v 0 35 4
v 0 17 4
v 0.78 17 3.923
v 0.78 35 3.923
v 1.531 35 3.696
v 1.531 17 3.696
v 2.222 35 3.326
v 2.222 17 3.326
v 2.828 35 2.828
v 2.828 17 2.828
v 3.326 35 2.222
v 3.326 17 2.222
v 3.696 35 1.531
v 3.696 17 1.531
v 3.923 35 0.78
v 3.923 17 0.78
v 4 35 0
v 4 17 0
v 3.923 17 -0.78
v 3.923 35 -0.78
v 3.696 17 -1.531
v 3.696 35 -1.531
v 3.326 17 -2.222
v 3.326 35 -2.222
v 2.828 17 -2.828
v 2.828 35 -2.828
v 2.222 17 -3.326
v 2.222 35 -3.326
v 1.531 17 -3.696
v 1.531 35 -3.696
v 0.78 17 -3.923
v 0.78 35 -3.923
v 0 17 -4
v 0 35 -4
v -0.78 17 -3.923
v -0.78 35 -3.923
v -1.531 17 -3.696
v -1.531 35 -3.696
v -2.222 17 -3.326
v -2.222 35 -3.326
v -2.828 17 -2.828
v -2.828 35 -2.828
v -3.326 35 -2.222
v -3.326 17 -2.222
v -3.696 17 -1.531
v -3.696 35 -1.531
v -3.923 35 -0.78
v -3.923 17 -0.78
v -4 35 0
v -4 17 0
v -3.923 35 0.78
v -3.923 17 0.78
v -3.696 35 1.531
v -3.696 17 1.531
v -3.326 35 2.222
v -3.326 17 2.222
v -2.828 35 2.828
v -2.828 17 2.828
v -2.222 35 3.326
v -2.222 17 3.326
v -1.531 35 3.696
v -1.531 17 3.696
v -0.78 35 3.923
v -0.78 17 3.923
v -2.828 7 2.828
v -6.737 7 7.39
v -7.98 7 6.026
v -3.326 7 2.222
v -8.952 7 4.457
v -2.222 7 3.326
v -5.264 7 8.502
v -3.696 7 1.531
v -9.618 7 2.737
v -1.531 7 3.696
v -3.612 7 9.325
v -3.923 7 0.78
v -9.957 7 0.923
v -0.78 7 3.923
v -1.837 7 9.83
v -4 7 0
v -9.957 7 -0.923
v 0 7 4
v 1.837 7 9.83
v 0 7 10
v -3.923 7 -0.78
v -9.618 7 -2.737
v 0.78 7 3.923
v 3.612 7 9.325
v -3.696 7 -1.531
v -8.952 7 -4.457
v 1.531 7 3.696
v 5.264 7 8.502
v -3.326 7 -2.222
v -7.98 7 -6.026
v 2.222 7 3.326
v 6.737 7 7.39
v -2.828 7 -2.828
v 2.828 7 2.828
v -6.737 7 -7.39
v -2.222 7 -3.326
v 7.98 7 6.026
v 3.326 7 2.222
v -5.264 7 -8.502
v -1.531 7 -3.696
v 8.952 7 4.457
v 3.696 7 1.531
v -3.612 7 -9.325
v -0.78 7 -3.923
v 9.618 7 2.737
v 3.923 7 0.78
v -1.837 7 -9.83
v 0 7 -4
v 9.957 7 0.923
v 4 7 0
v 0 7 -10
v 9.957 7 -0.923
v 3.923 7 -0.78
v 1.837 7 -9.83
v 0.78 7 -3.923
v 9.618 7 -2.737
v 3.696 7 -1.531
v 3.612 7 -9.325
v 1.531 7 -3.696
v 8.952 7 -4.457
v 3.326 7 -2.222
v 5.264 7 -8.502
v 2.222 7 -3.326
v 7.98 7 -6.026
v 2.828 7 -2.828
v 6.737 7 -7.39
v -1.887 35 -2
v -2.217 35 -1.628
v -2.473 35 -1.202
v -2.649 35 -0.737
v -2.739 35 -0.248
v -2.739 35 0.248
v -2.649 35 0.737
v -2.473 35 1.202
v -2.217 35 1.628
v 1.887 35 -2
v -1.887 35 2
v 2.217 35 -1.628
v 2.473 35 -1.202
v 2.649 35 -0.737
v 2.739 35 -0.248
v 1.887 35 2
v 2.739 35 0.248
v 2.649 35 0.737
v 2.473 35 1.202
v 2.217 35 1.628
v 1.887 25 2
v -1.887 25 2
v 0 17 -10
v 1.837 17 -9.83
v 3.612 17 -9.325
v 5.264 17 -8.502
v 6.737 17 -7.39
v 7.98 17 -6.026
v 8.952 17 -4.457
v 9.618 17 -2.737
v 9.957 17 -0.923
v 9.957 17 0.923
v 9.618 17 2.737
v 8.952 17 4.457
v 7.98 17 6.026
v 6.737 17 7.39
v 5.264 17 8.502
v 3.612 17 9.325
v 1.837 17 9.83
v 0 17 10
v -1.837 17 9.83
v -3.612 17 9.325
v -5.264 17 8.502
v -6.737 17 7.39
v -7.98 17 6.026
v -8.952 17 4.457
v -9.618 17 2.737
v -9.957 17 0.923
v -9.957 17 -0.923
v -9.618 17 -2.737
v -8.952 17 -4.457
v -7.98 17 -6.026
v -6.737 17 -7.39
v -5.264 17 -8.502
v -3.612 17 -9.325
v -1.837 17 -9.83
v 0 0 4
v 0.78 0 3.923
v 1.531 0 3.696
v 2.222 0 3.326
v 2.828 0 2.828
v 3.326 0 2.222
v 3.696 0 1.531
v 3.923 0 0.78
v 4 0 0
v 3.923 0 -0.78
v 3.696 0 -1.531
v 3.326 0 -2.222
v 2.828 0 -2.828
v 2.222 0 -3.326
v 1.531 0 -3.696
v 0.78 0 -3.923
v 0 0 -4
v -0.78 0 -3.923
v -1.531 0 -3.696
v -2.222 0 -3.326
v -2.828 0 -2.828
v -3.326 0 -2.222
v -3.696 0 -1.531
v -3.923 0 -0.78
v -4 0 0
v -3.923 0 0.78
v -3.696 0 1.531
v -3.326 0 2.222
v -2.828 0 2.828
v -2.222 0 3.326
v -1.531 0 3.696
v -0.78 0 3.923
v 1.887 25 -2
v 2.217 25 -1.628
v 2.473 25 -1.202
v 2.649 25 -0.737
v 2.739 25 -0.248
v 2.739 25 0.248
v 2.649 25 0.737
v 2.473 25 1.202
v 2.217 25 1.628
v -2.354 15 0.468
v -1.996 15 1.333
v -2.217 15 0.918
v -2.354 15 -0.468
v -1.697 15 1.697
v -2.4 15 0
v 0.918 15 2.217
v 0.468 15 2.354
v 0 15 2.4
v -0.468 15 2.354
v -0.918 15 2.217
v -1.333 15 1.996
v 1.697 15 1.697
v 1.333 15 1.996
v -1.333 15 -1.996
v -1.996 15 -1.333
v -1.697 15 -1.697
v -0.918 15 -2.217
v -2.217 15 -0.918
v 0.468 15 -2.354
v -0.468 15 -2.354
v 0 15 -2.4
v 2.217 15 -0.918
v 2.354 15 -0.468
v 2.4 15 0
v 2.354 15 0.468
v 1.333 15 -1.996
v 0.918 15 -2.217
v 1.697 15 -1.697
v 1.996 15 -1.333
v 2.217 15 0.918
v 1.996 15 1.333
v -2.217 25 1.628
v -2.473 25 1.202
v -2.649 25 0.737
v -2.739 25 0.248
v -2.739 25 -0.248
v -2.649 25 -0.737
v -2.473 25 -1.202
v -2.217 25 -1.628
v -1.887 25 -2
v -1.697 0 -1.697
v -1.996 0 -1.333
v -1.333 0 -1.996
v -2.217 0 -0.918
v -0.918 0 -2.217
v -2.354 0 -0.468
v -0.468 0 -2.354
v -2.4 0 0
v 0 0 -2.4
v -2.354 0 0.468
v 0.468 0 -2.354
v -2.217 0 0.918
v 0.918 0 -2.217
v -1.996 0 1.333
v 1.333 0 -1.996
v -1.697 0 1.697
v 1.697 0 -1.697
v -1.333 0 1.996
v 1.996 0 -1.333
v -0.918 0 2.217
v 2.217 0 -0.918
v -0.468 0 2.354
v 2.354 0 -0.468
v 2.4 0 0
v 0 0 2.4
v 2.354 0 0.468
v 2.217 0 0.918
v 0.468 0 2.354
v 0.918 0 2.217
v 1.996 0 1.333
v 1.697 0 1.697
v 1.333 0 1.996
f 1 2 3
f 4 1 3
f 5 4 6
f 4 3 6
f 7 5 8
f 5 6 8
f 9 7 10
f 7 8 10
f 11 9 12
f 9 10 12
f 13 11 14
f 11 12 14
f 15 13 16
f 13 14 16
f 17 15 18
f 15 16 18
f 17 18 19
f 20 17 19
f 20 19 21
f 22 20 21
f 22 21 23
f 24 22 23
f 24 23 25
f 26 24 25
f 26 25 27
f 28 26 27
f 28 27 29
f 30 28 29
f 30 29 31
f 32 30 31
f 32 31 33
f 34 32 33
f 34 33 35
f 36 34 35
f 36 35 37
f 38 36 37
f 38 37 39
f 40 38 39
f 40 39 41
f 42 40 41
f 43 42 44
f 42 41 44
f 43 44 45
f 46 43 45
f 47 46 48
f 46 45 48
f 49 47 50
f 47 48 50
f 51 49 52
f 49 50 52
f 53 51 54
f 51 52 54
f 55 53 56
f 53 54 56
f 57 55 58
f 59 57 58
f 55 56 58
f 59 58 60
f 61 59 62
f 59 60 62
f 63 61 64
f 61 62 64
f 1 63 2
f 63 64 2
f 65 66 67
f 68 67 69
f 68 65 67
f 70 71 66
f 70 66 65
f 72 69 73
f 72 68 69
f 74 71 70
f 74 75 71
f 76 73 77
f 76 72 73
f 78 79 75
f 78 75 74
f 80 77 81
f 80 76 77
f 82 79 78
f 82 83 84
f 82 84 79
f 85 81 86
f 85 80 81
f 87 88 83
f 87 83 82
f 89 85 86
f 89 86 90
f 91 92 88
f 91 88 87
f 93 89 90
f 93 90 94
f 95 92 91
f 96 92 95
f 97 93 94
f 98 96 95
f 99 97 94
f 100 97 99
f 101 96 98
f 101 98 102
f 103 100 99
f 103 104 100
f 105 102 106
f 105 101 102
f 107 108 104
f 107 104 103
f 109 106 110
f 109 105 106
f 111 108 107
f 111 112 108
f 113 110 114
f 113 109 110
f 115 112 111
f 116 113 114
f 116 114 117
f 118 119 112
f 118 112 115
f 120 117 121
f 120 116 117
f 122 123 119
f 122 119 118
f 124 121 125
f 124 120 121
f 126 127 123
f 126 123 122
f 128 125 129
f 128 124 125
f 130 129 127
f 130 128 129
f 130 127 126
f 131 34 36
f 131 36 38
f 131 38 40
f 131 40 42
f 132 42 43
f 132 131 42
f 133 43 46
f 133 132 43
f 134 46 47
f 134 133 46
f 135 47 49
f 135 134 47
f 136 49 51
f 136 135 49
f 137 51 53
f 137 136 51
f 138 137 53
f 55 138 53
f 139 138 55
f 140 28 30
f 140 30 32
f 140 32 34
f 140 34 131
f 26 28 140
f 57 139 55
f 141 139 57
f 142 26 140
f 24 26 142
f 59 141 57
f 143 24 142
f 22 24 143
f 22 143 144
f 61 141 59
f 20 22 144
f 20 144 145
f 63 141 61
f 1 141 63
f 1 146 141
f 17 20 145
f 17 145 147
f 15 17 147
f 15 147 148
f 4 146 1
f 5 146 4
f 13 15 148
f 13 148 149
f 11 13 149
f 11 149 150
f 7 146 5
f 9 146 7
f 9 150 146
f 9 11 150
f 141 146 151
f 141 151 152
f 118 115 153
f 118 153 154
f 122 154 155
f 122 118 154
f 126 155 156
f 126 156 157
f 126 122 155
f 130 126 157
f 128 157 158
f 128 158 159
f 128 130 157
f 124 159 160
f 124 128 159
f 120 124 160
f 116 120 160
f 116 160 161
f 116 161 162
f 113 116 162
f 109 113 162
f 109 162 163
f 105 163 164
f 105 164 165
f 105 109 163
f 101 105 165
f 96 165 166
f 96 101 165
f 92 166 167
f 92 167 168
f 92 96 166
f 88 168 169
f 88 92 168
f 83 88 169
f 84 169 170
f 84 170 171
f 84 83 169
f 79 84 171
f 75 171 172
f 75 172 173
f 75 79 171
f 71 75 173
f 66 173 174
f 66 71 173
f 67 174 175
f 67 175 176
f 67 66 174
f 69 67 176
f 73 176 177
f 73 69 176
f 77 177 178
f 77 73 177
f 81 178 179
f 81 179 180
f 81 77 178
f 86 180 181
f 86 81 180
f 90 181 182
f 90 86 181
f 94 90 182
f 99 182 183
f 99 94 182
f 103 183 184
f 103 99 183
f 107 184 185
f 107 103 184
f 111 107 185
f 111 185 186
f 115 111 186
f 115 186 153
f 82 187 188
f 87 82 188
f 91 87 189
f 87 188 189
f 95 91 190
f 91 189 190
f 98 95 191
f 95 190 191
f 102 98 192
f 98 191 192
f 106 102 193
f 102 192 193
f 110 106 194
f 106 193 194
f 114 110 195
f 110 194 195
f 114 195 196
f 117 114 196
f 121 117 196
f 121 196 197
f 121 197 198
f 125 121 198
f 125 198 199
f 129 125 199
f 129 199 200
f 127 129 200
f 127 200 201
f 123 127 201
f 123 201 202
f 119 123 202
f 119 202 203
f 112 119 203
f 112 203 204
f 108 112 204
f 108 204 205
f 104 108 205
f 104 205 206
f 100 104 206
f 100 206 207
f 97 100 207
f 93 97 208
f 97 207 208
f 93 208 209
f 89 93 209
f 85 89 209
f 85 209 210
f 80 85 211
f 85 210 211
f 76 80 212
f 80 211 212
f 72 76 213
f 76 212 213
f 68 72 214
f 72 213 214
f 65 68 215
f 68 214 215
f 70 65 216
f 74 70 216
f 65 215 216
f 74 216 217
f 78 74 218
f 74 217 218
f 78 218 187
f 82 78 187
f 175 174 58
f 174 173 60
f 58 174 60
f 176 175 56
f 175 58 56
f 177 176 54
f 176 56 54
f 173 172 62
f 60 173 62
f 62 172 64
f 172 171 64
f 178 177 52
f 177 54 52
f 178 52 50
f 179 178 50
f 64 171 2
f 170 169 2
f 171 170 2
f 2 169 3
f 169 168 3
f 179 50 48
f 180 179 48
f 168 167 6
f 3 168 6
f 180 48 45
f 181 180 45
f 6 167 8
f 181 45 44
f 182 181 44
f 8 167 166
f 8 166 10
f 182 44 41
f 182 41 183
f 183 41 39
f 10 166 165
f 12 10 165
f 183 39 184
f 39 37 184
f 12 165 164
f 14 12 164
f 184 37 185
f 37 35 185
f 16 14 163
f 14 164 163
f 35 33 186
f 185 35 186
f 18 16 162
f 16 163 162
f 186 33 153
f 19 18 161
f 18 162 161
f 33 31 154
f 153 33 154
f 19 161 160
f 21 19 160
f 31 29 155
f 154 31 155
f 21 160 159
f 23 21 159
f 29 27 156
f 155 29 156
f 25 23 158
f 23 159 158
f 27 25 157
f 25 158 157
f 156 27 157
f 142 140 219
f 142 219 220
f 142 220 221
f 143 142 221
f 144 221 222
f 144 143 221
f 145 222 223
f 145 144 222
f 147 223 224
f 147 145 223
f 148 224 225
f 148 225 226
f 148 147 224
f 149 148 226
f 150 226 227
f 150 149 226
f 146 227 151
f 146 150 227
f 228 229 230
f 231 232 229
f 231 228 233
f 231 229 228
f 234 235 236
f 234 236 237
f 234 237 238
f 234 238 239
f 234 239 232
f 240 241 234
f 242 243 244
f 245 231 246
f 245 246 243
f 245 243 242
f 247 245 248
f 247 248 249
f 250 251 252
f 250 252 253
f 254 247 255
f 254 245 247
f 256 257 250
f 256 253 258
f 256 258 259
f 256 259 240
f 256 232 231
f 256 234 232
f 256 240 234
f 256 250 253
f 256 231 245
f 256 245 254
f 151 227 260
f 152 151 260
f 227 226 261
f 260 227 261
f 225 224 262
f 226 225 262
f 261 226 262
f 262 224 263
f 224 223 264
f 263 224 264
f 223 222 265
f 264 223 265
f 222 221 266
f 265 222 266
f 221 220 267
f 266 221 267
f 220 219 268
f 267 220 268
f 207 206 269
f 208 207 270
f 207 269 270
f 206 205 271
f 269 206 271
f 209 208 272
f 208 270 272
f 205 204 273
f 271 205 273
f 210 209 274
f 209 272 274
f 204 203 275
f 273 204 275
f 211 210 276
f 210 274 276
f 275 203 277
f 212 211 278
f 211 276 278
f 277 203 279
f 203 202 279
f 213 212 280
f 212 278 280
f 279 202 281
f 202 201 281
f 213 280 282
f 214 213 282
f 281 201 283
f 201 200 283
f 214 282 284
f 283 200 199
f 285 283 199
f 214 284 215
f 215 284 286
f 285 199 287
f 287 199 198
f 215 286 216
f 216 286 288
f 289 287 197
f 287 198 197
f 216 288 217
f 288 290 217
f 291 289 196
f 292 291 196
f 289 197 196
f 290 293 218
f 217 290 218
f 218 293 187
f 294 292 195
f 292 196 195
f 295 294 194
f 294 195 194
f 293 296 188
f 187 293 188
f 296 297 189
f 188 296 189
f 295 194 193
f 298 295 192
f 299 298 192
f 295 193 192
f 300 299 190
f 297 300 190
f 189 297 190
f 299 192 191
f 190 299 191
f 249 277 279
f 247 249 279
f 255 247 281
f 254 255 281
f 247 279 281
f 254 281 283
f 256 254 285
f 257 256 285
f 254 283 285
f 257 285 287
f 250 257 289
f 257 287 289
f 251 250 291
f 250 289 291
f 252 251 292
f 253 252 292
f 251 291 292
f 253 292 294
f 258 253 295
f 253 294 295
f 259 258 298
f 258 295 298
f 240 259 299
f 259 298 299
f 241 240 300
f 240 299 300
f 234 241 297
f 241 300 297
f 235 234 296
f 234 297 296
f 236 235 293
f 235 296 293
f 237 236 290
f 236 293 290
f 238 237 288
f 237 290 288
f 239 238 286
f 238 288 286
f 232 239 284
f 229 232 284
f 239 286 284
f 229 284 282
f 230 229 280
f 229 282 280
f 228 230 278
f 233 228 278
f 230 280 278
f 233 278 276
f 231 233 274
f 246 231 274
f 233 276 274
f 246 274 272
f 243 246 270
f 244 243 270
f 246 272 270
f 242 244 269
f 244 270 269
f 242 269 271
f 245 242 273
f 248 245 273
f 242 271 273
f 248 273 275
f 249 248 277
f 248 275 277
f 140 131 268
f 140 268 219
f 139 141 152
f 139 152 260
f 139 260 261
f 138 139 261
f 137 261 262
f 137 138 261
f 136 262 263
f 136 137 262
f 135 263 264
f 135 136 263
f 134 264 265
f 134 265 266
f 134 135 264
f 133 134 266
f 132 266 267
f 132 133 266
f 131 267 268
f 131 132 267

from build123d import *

# Parameters (mm, degrees)
SKETCH1_R           = 4
BOSS_EXTRUDE1_DEPTH = 35
CUT_EXTRUDE1_DEPTH  = 10
SKETCH3_R           = 2.4
CUT_EXTRUDE2_DEPTH  = 15
BOSS_EXTRUDE2_START = -7
SKETCH4_R           = 10
SKETCH4_R_2         = 4
BOSS_EXTRUDE2_DEPTH = 10


with BuildPart() as part:
    # Sketch1 → Boss-Extrude1 (new body)
    with BuildSketch(Plane(origin=(0, 0, 0), x_dir=(1, 0, 0), z_dir=(0, 1, 0))):
        with Locations(Location((0, 0, 0), (0, 0, 270))):
            Circle(SKETCH1_R)
    extrude(amount=BOSS_EXTRUDE1_DEPTH)

    # Sketch2 → Cut-Extrude1 (cut)
    with BuildSketch(Plane(origin=(0, 35, 0), x_dir=(1, 0, 0), z_dir=(0, 1, 0))):
        with BuildLine():
            Line((-1.887458609, 2), (1.887458609, 2))
            ThreePointArc((1.887458609, 2), (2.75, 0), (1.887458609, -2))
            Line((1.887458609, -2), (-1.887458609, -2))
            ThreePointArc((-1.887458609, -2), (-2.75, 0), (-1.887458609, 2))
        make_face()
    extrude(amount=-CUT_EXTRUDE1_DEPTH, mode=Mode.SUBTRACT)

    # Sketch3 → Cut-Extrude2 (cut)
    with BuildSketch(Plane(origin=(0, 0, 0), x_dir=(-1, 0, 0), z_dir=(0, -1, 0))):
        with Locations(Location((0, 0, 0), (0, 0, 90))):
            Circle(SKETCH3_R)
    extrude(amount=-CUT_EXTRUDE2_DEPTH, mode=Mode.SUBTRACT)

    # Sketch4 → Boss-Extrude2 (add)
    with BuildSketch(Plane.XZ.offset(BOSS_EXTRUDE2_START)):
        with Locations(Location((0, 0, 0), (0, 0, 270))):
            Circle(SKETCH4_R)
        with Locations(Location((0, 0, 0), (0, 0, 270))):
            Circle(SKETCH4_R_2, mode=Mode.SUBTRACT)
    extrude(amount=-BOSS_EXTRUDE2_DEPTH)


solid = part.part
